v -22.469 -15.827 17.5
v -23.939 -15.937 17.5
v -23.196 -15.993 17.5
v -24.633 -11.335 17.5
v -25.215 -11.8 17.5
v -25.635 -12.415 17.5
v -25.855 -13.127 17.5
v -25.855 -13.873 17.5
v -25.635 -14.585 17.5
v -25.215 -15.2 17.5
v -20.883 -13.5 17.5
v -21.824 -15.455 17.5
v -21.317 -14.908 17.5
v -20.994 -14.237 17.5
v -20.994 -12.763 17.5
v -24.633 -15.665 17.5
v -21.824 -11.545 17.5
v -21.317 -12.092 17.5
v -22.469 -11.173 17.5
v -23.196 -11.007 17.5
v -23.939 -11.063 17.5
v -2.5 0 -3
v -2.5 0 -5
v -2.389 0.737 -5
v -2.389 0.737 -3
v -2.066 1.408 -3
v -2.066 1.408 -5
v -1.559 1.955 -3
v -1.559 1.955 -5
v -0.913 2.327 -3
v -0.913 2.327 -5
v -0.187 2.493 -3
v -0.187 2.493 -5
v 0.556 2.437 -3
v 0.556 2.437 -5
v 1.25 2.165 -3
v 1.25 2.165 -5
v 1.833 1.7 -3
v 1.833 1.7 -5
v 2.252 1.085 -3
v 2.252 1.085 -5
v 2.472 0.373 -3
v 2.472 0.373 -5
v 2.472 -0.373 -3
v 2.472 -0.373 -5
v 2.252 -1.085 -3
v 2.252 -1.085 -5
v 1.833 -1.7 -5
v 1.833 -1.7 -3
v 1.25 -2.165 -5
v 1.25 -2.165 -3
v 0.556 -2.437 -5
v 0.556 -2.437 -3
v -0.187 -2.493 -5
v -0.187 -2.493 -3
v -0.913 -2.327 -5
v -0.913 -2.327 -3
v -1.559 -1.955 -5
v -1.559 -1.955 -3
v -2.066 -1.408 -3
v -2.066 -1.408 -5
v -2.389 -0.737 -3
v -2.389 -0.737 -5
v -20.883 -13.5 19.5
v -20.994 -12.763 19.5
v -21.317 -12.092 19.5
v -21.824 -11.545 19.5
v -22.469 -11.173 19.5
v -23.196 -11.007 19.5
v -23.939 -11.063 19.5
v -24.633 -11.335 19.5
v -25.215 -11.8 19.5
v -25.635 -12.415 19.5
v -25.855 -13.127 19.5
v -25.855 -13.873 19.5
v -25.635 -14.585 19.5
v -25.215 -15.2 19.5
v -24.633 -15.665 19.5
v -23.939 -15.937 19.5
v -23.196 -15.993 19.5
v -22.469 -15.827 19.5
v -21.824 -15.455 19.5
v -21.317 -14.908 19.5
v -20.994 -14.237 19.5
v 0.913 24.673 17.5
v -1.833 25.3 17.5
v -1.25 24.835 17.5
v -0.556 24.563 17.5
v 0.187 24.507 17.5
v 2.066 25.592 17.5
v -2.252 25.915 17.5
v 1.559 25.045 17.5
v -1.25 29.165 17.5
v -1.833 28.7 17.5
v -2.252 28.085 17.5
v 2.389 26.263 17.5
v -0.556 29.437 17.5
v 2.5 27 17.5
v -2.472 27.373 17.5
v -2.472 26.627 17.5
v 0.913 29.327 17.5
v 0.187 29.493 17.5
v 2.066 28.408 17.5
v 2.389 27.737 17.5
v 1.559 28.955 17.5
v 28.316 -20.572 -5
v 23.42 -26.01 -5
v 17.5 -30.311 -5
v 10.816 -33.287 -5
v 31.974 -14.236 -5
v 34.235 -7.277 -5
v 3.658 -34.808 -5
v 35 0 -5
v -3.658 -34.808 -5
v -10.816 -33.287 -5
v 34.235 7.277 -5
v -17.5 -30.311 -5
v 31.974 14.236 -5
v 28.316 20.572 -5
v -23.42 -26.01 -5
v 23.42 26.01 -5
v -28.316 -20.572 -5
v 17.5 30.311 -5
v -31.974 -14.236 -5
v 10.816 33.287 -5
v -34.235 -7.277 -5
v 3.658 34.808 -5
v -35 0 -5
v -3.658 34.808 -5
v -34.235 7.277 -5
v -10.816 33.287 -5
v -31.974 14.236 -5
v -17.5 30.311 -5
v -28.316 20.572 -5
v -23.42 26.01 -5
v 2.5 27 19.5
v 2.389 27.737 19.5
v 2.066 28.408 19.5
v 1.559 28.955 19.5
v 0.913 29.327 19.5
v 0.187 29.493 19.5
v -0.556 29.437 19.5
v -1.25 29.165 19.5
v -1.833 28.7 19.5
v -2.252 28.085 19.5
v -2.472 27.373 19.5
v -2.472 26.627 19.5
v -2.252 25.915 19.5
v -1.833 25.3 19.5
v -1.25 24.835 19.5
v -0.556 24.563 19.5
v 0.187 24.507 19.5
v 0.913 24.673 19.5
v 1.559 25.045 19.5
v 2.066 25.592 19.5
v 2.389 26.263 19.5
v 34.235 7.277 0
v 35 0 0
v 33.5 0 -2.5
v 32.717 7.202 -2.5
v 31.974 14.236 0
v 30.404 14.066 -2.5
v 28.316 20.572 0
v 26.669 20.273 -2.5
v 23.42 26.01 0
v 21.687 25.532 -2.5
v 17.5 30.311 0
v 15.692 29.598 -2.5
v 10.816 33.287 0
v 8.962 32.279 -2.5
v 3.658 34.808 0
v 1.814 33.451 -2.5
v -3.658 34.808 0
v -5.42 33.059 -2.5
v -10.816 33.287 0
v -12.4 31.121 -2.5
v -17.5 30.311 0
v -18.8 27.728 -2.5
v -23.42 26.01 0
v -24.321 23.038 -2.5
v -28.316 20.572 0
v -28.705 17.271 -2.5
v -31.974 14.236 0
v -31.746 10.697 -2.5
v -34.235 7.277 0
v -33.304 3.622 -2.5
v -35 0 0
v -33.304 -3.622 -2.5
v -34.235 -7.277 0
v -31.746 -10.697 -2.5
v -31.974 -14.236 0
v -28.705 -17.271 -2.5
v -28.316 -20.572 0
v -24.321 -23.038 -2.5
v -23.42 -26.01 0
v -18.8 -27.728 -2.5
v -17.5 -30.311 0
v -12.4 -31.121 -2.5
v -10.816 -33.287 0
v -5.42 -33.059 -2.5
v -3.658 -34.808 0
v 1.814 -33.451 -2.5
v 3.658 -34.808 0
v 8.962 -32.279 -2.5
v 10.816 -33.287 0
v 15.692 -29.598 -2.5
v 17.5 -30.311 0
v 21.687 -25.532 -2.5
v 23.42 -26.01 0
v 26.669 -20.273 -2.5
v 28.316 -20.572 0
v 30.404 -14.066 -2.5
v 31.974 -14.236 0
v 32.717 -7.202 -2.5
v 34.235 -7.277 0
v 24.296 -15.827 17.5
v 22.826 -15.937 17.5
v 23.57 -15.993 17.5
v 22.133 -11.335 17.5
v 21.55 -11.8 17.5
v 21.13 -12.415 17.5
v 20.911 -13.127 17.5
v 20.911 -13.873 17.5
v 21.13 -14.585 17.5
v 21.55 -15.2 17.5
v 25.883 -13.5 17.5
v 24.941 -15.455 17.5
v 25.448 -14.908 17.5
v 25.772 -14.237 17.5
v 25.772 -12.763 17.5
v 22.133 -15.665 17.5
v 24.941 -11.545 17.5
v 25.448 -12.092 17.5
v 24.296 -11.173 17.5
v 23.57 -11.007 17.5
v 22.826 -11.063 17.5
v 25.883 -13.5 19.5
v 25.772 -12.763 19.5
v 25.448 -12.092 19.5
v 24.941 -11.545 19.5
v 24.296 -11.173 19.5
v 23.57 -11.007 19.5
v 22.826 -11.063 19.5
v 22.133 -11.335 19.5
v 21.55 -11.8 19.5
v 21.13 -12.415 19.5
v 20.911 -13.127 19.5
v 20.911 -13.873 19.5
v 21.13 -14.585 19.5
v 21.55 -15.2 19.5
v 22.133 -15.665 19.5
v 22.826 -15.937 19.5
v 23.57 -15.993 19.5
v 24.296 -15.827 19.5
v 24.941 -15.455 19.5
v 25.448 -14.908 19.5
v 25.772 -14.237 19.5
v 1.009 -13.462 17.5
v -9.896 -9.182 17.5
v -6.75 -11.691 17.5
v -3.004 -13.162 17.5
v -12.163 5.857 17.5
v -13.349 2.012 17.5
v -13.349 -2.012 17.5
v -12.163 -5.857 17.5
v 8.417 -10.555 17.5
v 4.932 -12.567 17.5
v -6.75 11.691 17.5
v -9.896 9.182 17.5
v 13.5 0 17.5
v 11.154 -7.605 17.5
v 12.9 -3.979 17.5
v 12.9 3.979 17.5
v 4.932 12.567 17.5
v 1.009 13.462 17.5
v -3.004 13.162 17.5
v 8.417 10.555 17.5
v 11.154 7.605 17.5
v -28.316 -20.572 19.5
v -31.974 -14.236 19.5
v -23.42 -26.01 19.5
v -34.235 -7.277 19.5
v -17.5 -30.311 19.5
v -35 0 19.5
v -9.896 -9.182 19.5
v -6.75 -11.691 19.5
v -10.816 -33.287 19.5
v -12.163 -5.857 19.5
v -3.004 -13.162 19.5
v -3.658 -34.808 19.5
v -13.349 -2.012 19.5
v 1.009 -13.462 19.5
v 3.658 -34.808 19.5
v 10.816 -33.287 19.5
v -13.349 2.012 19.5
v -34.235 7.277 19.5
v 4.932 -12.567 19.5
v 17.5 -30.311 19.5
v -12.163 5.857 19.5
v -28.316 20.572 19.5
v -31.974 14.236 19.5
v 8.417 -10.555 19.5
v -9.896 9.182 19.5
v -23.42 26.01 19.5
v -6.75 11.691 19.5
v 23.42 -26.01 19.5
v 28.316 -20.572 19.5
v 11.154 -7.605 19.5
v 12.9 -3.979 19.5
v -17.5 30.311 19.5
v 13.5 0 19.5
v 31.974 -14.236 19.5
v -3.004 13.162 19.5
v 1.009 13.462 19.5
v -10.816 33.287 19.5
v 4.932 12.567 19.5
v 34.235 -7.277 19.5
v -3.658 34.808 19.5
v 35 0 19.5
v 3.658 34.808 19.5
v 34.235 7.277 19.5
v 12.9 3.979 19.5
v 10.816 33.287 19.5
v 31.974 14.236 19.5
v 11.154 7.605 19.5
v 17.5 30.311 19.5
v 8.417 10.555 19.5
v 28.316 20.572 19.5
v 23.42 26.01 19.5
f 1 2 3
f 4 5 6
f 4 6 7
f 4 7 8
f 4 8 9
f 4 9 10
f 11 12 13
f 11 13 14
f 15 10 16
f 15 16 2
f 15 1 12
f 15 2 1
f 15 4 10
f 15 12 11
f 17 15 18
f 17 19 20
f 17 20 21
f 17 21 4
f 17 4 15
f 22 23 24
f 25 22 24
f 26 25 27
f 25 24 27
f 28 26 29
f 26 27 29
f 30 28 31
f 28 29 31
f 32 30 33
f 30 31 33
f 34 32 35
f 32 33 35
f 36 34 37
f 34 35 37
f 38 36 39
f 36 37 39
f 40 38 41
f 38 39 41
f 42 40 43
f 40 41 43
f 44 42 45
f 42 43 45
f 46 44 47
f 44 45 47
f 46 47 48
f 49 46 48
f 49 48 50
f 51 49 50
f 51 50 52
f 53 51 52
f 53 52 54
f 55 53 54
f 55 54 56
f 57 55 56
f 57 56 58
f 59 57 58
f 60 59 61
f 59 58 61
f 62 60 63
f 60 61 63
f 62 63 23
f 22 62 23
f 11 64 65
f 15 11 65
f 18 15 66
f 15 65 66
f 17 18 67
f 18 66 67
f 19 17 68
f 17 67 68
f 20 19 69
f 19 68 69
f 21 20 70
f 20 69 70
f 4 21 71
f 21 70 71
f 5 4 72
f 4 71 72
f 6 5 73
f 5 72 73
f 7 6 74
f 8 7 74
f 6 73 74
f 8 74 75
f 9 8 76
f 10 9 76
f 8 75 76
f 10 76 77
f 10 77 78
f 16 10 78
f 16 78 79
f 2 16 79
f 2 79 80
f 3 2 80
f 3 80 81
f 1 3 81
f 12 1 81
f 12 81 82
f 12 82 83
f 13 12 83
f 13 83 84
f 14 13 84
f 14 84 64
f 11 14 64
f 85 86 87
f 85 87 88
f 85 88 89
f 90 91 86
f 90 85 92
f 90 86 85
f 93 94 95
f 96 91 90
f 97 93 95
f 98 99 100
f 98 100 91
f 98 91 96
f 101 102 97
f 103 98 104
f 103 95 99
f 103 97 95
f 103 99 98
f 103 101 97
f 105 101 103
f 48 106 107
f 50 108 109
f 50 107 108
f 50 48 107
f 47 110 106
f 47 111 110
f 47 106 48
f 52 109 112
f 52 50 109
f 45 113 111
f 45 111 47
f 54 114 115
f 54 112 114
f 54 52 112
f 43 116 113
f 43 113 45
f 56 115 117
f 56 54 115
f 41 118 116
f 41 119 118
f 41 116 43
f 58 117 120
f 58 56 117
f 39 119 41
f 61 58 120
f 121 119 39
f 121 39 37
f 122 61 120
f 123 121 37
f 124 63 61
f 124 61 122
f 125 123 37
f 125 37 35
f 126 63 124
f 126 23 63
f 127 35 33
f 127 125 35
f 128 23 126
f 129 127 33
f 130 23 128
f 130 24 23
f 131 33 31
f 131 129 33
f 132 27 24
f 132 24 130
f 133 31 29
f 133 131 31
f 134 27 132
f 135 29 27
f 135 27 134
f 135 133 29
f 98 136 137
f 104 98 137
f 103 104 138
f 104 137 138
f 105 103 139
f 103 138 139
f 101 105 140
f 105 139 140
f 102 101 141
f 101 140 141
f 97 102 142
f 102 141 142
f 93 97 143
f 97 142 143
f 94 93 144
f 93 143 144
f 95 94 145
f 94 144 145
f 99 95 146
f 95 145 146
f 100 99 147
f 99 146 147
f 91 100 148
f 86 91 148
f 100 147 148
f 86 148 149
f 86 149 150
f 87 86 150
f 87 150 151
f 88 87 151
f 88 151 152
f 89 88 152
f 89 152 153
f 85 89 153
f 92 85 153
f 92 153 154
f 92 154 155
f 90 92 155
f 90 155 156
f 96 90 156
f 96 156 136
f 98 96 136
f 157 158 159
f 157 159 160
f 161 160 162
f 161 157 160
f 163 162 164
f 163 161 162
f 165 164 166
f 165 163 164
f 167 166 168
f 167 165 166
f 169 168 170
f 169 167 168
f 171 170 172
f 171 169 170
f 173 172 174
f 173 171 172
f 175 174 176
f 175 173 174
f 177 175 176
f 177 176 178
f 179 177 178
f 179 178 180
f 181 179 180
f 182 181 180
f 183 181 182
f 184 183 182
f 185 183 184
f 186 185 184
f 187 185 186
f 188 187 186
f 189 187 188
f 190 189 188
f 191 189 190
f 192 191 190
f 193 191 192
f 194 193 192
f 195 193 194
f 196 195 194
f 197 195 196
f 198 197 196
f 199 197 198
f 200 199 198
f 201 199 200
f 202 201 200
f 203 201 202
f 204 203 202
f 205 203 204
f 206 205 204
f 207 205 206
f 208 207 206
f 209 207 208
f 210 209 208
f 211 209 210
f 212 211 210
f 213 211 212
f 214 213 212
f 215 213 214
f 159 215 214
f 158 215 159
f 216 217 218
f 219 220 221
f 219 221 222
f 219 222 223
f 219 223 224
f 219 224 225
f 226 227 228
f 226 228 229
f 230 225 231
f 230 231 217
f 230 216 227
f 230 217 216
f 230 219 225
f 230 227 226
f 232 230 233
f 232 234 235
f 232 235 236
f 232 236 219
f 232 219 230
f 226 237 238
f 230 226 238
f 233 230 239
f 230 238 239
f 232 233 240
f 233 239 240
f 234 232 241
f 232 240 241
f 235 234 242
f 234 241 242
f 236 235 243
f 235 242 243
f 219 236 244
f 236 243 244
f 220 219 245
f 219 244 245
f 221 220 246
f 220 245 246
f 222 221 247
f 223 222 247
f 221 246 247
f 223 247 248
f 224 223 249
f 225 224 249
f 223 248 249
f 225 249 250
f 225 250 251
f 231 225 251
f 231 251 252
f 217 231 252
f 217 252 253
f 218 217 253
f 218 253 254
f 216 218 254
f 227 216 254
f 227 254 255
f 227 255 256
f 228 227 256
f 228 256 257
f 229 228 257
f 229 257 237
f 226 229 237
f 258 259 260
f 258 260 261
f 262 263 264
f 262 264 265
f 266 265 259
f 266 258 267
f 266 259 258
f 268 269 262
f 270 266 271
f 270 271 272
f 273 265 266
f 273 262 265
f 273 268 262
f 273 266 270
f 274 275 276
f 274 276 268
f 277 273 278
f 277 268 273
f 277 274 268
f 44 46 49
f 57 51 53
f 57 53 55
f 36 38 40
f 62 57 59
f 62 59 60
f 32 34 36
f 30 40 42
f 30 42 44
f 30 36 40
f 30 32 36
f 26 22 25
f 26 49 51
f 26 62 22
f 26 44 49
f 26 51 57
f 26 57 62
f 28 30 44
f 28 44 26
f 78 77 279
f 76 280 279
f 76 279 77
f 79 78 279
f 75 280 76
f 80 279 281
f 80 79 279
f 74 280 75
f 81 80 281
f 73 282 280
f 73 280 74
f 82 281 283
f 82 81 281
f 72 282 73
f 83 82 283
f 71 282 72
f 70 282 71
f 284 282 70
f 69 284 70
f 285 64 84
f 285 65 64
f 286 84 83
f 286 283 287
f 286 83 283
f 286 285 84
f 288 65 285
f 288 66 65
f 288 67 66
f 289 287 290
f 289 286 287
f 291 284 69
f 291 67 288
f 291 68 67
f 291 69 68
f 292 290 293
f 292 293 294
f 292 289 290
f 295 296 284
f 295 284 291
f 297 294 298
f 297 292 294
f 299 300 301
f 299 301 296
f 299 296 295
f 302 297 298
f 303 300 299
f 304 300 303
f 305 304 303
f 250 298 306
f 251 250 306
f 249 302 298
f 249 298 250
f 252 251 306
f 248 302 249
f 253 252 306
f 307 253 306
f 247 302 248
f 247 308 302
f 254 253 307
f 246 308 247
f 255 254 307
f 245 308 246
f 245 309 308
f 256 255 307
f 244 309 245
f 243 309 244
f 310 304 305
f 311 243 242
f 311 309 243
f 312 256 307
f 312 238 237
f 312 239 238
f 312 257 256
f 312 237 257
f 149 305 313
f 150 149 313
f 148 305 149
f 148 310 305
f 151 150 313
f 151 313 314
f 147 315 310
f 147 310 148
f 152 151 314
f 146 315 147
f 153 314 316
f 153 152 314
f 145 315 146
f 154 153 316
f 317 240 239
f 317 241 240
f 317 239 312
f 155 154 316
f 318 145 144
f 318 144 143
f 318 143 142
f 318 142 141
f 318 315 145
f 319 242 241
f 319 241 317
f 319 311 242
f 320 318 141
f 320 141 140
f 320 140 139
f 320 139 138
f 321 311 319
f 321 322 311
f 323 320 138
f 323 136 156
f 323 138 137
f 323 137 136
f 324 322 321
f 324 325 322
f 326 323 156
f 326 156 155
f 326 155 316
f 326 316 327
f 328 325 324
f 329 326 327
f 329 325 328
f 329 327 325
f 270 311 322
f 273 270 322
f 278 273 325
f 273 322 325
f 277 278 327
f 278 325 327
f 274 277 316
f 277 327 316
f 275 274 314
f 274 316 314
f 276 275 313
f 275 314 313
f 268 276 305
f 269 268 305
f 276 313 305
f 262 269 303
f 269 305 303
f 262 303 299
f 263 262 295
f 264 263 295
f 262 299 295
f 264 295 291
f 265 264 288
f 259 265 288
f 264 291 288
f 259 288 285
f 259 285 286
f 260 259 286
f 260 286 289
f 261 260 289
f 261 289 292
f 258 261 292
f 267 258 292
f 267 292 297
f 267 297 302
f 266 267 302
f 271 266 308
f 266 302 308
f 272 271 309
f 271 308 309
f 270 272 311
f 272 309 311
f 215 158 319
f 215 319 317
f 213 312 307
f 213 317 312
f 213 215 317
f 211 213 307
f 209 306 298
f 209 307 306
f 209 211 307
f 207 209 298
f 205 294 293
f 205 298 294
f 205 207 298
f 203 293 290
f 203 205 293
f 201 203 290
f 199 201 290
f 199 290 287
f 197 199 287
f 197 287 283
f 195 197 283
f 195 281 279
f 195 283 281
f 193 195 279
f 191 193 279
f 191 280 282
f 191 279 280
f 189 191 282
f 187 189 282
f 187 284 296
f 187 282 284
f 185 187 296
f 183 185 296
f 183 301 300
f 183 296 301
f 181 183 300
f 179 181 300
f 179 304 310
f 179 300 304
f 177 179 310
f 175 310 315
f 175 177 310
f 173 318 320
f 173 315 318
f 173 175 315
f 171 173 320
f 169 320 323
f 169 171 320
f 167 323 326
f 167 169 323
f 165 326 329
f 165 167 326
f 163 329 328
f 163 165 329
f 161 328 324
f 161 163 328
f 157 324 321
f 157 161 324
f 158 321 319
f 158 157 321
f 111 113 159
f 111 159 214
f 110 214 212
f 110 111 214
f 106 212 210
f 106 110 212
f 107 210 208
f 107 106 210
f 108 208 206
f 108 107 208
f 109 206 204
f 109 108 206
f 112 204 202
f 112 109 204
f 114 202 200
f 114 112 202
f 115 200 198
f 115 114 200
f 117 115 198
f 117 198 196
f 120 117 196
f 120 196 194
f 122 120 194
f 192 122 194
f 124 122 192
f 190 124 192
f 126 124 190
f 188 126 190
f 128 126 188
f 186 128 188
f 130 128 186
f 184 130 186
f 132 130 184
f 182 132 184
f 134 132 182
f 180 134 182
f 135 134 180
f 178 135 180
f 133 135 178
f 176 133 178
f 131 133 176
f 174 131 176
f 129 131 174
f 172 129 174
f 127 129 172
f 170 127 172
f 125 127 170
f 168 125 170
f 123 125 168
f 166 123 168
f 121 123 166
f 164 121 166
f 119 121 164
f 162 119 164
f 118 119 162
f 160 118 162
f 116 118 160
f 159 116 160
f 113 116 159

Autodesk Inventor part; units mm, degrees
ref_plane "YZ Plane" through (0, 0, 0) normal (1, 0, 0) x (0, 1, 0)
sketch "스케치1" plane through (0, 0, 0) normal (0, 0, 1) x (1, 0, 0)
  circle A0 centre (0, 0) radius 35
  dimension "d0" = 70
extrude "돌출1" add sketch "스케치1" along normal blind 19.5
sketch "스케치2" plane through (0, 0, 19.5) normal (0, 0, 1) x (1, 0, 0)
  line L0 (0, 0) -> (0, 27)
  circle A0 centre (0, 27) radius 2.5
  circle A1 centre (0, 0) radius 35 projected
  circle A2 centre (-23.3827, -13.5) radius 2.5
  circle A3 centre (23.3827, -13.5) radius 2.5
  circle A4 centre (0, 0) radius 13.5
  dimension "d3" = 27
  dimension "d4" = 5
  dimension "d7" = 360
extrude "돌출2" cut sketch "스케치2" against normal blind 2 contours A0 | A2 | A3 | A4
ref_plane "작업 평면1" through (0, 0, -2.5) normal (0, 0, -1) x (-1, 0, 0)
sketch "스케치4" plane through (0, 0, -2.5) normal (0, 0, -1) x (-1, 0, 0)
  circle A0 centre (0, 0) radius 33.5
  dimension "d12" = 67
loft "로프트1" add profiles "스케치4" section 1 edges at (-35, 0, 0)
ref_plane "작업 평면2" through (0, 0, -5) normal (0, 0, -1) x (-1, 0, 0)
sketch "스케치5" plane through (0, 0, -5) normal (0, 0, -1) x (-1, 0, 0)
  circle A0 centre (0, 0) radius 35
  dimension "d18" = 70
loft "로프트2" add profiles "스케치5" section 1 edges at (-33.5, 0, -2.5)
sketch "스케치6" plane through (0, 0, -5) normal (0, 0, -1) x (-1, 0, 0)
  circle A0 centre (0, 0) radius 2.5
  dimension "d23" = 5
extrude "돌출3" cut sketch "스케치6" against normal blind 2
properties part number "sensor"
